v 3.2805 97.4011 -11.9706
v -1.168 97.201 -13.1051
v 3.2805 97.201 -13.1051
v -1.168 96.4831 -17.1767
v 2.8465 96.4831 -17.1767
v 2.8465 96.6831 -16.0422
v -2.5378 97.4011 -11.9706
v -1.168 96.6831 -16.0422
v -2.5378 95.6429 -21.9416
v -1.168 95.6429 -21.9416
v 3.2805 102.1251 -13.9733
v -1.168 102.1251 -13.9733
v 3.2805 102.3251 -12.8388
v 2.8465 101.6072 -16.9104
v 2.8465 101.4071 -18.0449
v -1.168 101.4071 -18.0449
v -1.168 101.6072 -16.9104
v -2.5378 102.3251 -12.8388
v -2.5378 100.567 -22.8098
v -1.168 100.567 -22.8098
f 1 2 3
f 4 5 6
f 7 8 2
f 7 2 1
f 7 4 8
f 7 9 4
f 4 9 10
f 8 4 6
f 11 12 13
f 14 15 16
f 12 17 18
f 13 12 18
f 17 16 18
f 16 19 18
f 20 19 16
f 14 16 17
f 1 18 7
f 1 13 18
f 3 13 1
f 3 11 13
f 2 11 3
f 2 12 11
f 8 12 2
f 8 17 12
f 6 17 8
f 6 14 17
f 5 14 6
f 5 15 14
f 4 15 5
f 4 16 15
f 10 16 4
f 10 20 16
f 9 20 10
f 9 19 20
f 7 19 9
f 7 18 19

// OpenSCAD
$fa = 1.25;
$fs = 2;

char = "F";

rotate(-10, [1, 0, 0]) rotate(-90, [1, 0, 0]) {
    rotate(180) translate([0, -5, 98]) linear_extrude(height=5) {
        mirror([1, 0, 0]) text(char,
                               font="JetBrains Mono", size=10, 
                               valign="baseline", halign="center", $fs=2.5);
    }
}
